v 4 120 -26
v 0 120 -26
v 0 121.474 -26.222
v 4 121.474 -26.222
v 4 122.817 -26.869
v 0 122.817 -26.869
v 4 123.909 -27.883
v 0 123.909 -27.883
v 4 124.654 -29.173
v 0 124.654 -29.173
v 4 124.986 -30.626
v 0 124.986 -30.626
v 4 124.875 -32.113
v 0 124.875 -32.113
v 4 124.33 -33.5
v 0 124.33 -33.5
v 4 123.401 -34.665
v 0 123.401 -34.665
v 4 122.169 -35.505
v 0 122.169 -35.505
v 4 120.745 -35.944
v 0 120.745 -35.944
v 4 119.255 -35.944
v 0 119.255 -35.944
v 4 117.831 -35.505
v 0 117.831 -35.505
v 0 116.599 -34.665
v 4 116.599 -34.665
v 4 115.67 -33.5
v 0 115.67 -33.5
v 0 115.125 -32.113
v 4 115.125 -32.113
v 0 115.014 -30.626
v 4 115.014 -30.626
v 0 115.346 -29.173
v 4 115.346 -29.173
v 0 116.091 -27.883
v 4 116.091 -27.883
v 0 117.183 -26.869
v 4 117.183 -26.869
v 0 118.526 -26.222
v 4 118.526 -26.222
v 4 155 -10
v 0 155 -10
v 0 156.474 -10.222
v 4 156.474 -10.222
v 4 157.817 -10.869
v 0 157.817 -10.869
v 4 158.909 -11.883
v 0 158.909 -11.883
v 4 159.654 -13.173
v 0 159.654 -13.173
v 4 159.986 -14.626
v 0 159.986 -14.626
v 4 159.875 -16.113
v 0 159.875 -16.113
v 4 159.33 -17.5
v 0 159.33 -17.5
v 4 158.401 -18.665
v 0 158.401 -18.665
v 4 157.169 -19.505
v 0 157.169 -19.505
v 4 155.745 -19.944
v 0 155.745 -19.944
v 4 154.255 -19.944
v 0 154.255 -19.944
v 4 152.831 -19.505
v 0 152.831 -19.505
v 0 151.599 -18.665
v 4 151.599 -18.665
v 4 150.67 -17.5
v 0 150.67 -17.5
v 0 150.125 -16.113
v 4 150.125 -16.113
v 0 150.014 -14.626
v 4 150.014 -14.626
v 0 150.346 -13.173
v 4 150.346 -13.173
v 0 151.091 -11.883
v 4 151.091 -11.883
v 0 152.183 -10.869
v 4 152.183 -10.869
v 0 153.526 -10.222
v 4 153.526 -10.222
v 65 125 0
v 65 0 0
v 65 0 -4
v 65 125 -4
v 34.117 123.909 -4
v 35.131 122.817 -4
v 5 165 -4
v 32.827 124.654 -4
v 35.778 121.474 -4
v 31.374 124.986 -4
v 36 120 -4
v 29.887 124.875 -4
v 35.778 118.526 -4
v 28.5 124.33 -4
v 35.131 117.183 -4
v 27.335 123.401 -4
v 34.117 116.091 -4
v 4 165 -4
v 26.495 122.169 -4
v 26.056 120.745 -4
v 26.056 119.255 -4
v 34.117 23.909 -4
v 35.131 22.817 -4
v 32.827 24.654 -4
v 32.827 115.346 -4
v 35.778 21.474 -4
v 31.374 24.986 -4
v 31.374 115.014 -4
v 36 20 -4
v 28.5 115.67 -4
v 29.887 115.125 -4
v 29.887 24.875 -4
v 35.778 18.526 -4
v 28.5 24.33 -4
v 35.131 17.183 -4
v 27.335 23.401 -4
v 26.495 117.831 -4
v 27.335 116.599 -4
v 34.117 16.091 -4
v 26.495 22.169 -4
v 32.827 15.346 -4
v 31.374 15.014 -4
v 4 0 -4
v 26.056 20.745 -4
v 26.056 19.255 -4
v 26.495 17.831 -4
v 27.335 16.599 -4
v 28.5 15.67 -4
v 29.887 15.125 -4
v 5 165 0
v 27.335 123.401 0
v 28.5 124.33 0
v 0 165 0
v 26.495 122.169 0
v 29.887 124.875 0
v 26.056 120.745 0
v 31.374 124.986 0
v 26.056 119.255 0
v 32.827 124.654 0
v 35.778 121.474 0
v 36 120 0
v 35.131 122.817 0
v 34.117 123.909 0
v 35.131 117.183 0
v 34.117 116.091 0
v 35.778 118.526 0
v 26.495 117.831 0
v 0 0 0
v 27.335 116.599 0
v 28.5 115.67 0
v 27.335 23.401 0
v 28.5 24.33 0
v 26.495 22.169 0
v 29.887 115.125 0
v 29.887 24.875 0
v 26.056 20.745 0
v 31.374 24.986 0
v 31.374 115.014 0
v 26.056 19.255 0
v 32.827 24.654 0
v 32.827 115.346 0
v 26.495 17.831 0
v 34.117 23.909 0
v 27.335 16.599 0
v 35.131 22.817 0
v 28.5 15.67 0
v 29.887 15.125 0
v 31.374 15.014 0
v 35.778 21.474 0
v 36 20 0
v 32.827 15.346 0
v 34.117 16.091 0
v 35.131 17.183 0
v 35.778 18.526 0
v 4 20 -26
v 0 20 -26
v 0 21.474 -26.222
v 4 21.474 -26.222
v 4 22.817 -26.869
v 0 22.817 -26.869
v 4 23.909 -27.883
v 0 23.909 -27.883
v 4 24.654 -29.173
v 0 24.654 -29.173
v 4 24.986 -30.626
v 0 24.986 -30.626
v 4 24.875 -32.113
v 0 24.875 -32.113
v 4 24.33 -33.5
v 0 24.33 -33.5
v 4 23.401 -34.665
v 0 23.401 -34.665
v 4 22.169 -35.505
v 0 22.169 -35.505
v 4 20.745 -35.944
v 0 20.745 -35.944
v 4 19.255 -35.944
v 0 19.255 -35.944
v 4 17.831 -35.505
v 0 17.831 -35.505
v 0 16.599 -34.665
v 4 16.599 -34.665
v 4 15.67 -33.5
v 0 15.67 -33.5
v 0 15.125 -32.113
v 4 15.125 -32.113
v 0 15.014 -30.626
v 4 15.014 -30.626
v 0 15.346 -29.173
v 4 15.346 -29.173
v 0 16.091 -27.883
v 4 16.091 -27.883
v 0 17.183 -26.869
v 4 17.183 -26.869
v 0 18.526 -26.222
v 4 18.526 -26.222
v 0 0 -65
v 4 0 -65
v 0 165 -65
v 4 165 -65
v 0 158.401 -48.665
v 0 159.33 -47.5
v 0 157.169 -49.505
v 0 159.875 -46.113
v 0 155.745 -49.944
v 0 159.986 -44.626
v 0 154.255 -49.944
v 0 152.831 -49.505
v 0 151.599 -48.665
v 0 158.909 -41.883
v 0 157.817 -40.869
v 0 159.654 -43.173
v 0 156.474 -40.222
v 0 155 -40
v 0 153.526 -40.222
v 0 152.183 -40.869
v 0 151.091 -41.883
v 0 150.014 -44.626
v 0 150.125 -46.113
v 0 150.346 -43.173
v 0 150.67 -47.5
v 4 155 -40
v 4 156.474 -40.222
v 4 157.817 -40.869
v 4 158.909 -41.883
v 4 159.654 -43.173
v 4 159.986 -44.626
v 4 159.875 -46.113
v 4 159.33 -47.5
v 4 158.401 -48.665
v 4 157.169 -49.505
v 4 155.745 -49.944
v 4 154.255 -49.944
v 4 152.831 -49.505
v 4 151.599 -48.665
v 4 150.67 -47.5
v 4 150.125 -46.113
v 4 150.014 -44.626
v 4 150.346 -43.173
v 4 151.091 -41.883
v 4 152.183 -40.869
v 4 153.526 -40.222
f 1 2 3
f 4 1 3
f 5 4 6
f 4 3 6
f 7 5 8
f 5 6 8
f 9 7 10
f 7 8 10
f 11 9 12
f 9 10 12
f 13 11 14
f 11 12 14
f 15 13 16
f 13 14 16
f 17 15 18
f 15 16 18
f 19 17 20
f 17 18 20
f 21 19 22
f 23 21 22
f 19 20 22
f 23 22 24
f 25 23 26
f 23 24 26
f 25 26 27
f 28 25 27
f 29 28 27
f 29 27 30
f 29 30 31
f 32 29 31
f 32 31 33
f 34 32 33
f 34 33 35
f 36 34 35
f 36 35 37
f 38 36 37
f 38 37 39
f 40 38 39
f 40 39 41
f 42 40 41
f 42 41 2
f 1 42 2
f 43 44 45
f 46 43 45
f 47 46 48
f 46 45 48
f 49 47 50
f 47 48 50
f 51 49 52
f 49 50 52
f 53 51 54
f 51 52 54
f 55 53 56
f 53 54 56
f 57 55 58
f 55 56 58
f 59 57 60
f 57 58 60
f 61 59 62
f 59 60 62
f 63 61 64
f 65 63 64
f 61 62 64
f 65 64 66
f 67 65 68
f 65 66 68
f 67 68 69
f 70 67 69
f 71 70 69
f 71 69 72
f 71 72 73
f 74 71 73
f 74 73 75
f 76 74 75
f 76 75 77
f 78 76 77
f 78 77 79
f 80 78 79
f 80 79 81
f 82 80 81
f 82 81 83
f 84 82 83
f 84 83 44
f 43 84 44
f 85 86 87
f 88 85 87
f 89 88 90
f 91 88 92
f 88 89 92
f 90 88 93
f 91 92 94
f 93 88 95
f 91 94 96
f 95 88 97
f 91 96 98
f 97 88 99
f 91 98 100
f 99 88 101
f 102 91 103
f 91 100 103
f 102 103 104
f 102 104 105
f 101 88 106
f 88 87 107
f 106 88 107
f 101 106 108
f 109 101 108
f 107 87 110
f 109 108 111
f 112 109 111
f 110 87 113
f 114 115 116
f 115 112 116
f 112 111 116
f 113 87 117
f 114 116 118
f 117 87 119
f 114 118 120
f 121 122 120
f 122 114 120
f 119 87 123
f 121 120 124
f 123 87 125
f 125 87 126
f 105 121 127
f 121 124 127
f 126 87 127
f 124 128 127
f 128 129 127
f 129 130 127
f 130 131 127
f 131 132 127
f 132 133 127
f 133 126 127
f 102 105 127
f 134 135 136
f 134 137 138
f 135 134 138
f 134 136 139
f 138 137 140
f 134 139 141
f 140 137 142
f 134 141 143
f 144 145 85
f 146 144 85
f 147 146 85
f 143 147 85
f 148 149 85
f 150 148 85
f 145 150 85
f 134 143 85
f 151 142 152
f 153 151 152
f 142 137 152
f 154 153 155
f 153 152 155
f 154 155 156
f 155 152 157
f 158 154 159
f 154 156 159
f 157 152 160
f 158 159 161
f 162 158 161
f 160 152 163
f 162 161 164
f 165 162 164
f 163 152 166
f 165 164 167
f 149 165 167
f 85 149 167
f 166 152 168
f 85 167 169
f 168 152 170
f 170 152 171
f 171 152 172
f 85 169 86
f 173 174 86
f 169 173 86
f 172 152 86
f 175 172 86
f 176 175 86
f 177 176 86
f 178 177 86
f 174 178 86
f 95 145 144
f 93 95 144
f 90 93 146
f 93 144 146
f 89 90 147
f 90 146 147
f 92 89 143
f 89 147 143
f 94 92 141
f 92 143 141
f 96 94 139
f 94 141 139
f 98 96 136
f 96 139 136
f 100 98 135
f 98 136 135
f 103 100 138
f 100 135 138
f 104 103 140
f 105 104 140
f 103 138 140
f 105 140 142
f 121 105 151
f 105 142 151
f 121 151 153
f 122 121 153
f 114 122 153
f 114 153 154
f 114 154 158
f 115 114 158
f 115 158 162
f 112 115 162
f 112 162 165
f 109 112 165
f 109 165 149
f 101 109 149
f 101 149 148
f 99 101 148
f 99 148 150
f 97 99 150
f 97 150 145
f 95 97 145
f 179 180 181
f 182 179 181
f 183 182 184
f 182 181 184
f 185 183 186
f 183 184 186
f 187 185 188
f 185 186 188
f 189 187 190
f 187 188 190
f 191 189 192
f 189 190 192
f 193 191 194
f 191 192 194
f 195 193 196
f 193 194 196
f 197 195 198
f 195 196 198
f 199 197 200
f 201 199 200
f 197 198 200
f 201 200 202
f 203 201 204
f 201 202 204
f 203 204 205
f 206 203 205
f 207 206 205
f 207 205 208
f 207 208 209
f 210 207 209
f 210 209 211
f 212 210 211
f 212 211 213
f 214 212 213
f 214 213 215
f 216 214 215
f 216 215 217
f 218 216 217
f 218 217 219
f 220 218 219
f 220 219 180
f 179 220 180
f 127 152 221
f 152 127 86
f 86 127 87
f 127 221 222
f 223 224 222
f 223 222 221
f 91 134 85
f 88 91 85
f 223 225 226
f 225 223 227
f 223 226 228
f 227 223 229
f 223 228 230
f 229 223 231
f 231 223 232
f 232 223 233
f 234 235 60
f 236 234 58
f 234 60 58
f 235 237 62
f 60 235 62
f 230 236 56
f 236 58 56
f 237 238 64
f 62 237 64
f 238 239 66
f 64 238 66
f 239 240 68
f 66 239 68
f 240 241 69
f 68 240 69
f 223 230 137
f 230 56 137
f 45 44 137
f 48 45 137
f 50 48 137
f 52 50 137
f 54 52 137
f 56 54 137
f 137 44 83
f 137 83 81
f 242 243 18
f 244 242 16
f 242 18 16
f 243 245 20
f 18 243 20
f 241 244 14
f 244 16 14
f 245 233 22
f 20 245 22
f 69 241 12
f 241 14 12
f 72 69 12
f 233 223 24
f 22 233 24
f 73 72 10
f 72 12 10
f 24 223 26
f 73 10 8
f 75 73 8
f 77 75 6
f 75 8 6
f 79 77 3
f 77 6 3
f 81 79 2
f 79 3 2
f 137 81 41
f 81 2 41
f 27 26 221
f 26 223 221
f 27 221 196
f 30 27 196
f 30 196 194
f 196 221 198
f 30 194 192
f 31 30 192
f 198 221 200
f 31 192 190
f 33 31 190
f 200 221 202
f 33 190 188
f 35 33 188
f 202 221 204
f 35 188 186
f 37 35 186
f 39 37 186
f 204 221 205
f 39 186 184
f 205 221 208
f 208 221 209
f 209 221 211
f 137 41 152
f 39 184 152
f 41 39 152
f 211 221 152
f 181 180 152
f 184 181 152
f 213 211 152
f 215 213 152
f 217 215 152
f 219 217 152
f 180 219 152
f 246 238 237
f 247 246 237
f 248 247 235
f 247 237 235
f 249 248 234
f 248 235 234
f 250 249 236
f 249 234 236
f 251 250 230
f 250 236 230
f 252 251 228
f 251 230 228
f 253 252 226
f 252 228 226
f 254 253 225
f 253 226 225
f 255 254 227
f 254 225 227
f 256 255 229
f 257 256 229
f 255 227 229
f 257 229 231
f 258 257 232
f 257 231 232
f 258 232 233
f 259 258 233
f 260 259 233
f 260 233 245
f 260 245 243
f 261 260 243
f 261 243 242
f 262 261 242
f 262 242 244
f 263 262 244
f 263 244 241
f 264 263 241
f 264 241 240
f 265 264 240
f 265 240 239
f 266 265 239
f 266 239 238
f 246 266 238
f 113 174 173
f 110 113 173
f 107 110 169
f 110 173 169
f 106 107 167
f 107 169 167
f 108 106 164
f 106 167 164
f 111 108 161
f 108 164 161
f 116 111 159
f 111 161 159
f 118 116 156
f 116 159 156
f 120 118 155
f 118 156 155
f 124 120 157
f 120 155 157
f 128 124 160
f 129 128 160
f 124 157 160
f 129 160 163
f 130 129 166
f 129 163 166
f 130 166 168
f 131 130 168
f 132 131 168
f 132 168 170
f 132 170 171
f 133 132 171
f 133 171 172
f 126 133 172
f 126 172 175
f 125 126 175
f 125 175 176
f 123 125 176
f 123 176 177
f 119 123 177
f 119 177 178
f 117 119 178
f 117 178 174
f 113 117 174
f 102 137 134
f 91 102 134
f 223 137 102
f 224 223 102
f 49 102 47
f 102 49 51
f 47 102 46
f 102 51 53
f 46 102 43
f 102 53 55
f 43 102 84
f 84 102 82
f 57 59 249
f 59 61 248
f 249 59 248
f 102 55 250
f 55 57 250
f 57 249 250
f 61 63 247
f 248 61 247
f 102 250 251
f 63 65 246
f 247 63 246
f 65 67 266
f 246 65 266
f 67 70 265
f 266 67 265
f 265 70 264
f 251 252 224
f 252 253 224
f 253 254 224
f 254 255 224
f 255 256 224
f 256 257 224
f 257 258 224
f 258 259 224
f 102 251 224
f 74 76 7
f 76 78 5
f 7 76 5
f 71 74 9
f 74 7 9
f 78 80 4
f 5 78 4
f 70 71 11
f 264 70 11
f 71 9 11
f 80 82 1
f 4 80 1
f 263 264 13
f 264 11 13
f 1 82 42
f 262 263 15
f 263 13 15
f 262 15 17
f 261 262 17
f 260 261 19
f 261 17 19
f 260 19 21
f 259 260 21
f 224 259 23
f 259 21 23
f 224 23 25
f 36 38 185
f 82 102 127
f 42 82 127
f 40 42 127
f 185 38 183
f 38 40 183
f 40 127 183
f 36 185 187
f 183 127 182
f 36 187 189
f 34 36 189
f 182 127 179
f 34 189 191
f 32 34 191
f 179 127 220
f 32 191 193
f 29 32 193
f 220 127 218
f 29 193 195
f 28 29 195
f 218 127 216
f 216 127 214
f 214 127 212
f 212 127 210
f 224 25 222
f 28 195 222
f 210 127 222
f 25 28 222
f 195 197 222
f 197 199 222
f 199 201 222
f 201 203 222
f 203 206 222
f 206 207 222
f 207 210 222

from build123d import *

# Parameters (mm, degrees)
EXTRUDE_1_DEPTH     = 165
SKETCH_2_R          = 5
CUT_EXTRUDE_1_DEPTH = 10
SKETCH_3_R          = 5
CUT_EXTRUDE_2_DEPTH = 10
CUT_EXTRUDE_3_DEPTH = 66


with BuildPart() as part:
    # Эскиз1 → Вытянуть-Тонкостенный1 (new body)
    with BuildSketch(Plane(origin=(0, 0, 0), x_dir=(1, 0, 0), z_dir=(0, 1, 0))):
        Polygon((0, 65), (0, 0), (65, 0), (65, 4), (4, 4), (4, 65), align=None)
    extrude(amount=EXTRUDE_1_DEPTH)

    # Эскиз2 → Вырез-Вытянуть1 (cut)
    with BuildSketch(Plane.XY):
        with Locations((31, 120)):
            Circle(SKETCH_2_R)
        with Locations((31, 20)):
            Circle(SKETCH_2_R)
    extrude(amount=-CUT_EXTRUDE_1_DEPTH, mode=Mode.SUBTRACT)

    # Эскиз3 → Вырез-Вытянуть2 (cut)
    with BuildSketch(Plane.ZY):
        with Locations((-31, 120)):
            Circle(SKETCH_3_R)
        with Locations((-31, 20)):
            Circle(SKETCH_3_R)
        with Locations((-15, 155)):
            Circle(SKETCH_3_R)
        with Locations((-45, 155)):
            Circle(SKETCH_3_R)
    extrude(amount=-CUT_EXTRUDE_2_DEPTH, mode=Mode.SUBTRACT)

    # Эскиз4 → Вырез-Вытянуть3 (cut, through all)
    with BuildSketch(Plane.XY):
        Polygon((5, 165), (65, 125), (65, 165), align=None)
    extrude(amount=-CUT_EXTRUDE_3_DEPTH, mode=Mode.SUBTRACT)


solid = part.part
